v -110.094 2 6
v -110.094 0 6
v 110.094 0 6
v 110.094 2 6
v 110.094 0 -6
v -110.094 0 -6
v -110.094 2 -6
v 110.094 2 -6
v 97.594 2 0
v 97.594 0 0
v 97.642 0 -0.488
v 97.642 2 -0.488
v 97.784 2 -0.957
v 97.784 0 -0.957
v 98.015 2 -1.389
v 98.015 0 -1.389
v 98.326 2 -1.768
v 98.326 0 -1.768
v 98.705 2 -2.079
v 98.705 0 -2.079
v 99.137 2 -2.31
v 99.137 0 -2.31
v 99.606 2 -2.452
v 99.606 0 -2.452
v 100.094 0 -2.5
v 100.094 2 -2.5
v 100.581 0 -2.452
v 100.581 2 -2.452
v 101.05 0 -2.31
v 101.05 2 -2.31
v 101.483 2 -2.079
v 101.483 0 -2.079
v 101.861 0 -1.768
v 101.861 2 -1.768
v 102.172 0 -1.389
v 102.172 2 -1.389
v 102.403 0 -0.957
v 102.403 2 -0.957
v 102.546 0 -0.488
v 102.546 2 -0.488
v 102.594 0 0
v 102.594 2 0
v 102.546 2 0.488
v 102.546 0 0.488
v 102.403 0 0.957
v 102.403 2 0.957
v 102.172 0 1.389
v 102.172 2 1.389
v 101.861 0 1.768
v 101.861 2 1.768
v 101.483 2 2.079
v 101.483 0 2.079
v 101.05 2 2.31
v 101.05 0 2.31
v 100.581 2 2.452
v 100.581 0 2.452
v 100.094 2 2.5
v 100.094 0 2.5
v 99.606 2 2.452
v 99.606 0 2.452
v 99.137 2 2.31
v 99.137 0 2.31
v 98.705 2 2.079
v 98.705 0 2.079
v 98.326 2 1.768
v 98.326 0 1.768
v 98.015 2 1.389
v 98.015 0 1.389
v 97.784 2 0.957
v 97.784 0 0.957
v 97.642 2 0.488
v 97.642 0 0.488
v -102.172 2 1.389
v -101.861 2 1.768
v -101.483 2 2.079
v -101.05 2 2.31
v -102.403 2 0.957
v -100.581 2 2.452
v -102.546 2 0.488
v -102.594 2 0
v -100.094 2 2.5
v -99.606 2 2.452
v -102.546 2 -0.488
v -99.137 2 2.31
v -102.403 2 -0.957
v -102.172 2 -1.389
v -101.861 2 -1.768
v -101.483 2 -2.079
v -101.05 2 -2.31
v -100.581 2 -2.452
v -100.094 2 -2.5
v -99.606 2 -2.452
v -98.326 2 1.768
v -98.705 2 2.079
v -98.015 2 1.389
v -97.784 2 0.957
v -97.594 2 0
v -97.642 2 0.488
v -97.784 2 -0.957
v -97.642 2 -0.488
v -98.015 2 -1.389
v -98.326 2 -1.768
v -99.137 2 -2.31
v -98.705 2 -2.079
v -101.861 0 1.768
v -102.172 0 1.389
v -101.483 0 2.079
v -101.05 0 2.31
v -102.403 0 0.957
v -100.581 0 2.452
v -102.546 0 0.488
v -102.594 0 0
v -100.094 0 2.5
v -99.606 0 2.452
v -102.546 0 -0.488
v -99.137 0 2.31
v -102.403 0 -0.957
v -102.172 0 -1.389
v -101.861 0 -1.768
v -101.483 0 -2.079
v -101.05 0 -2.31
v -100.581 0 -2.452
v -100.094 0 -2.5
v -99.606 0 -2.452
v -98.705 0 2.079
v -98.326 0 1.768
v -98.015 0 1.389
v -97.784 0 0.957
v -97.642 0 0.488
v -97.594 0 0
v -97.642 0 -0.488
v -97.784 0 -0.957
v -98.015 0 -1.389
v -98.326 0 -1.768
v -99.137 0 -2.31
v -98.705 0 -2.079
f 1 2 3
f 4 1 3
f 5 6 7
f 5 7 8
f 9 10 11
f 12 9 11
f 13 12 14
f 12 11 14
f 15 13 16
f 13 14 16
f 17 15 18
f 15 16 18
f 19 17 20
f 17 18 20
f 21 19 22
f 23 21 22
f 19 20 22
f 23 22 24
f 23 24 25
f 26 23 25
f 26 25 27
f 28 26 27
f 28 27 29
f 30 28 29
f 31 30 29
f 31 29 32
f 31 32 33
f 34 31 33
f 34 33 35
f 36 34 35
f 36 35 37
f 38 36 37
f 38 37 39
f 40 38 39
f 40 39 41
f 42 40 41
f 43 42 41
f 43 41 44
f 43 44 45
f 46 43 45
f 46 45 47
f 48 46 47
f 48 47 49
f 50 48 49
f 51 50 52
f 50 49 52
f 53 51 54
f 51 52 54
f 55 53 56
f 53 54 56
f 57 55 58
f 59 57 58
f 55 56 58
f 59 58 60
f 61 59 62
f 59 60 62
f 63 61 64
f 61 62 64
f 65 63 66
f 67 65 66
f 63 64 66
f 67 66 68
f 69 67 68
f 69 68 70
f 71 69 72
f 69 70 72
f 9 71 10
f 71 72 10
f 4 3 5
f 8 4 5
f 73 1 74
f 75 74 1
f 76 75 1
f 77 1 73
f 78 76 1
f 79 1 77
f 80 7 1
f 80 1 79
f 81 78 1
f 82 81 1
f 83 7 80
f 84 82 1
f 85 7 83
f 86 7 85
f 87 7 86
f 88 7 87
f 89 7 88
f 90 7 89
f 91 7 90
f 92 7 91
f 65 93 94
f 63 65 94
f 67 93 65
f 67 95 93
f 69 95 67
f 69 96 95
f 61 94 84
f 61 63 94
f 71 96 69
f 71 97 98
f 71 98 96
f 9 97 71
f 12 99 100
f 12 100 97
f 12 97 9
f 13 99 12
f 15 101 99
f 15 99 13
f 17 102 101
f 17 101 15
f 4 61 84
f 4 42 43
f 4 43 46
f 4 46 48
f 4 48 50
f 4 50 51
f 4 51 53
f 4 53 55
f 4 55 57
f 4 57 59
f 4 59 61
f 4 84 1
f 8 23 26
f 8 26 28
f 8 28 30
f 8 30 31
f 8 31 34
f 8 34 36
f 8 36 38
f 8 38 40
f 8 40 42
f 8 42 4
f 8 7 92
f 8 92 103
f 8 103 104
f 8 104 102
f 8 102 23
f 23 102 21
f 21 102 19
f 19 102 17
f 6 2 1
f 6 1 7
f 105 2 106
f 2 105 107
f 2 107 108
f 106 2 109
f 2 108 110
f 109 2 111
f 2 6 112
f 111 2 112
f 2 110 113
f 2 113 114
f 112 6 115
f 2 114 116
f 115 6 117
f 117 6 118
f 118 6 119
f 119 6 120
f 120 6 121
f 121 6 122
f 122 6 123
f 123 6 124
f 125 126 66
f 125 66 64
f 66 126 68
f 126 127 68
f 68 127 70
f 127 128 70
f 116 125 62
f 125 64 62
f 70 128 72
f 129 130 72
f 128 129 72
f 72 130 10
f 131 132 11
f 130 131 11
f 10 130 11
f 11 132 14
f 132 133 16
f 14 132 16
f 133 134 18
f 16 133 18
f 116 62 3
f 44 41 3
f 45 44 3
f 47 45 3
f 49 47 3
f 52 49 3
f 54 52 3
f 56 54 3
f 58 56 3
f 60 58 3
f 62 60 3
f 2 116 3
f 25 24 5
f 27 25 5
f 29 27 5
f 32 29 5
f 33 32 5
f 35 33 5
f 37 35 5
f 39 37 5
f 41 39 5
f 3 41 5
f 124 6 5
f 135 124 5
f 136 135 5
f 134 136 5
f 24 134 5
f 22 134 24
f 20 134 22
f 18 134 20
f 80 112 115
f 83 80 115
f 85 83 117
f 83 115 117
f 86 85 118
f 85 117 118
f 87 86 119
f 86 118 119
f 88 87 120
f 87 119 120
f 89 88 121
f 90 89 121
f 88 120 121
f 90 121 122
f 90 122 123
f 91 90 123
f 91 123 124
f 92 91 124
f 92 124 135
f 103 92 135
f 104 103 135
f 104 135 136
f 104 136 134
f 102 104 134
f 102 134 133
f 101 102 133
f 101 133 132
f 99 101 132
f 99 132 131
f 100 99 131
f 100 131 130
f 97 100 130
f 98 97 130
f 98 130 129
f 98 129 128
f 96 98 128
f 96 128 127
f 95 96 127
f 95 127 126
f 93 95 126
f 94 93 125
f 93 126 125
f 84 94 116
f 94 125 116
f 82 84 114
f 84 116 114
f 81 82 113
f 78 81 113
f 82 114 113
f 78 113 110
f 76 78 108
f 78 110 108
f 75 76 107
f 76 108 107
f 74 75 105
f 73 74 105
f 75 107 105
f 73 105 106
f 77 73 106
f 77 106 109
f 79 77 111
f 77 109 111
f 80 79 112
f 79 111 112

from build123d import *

# Parameters (mm, degrees)
SKETCH1_W                 = 220.18723
SKETCH1_H                 = 12
BOSS_EXTRUDE1_DEPTH       = 2
F_5_0MM_DOWEL_HOLE1_D     = 5
F_5_0MM_DOWEL_HOLE1_DEPTH = 2


with BuildPart() as part:
    # Sketch1 → Boss-Extrude1 (new body)
    with BuildSketch(Plane(origin=(0, 0, 0), x_dir=(1, 0, 0), z_dir=(0, 1, 0))):
        Rectangle(SKETCH1_W, SKETCH1_H)
    extrude(amount=BOSS_EXTRUDE1_DEPTH)

    # Ø5.0mm Dowel Hole1
    with Locations(Plane(origin=(0, 2, 0), x_dir=(1, 0, 0), z_dir=(0, 1, 0))):
        with Locations((-100.093615, 0), (100.093615, 0)):
            Hole(F_5_0MM_DOWEL_HOLE1_D / 2, depth=F_5_0MM_DOWEL_HOLE1_DEPTH)


solid = part.part
